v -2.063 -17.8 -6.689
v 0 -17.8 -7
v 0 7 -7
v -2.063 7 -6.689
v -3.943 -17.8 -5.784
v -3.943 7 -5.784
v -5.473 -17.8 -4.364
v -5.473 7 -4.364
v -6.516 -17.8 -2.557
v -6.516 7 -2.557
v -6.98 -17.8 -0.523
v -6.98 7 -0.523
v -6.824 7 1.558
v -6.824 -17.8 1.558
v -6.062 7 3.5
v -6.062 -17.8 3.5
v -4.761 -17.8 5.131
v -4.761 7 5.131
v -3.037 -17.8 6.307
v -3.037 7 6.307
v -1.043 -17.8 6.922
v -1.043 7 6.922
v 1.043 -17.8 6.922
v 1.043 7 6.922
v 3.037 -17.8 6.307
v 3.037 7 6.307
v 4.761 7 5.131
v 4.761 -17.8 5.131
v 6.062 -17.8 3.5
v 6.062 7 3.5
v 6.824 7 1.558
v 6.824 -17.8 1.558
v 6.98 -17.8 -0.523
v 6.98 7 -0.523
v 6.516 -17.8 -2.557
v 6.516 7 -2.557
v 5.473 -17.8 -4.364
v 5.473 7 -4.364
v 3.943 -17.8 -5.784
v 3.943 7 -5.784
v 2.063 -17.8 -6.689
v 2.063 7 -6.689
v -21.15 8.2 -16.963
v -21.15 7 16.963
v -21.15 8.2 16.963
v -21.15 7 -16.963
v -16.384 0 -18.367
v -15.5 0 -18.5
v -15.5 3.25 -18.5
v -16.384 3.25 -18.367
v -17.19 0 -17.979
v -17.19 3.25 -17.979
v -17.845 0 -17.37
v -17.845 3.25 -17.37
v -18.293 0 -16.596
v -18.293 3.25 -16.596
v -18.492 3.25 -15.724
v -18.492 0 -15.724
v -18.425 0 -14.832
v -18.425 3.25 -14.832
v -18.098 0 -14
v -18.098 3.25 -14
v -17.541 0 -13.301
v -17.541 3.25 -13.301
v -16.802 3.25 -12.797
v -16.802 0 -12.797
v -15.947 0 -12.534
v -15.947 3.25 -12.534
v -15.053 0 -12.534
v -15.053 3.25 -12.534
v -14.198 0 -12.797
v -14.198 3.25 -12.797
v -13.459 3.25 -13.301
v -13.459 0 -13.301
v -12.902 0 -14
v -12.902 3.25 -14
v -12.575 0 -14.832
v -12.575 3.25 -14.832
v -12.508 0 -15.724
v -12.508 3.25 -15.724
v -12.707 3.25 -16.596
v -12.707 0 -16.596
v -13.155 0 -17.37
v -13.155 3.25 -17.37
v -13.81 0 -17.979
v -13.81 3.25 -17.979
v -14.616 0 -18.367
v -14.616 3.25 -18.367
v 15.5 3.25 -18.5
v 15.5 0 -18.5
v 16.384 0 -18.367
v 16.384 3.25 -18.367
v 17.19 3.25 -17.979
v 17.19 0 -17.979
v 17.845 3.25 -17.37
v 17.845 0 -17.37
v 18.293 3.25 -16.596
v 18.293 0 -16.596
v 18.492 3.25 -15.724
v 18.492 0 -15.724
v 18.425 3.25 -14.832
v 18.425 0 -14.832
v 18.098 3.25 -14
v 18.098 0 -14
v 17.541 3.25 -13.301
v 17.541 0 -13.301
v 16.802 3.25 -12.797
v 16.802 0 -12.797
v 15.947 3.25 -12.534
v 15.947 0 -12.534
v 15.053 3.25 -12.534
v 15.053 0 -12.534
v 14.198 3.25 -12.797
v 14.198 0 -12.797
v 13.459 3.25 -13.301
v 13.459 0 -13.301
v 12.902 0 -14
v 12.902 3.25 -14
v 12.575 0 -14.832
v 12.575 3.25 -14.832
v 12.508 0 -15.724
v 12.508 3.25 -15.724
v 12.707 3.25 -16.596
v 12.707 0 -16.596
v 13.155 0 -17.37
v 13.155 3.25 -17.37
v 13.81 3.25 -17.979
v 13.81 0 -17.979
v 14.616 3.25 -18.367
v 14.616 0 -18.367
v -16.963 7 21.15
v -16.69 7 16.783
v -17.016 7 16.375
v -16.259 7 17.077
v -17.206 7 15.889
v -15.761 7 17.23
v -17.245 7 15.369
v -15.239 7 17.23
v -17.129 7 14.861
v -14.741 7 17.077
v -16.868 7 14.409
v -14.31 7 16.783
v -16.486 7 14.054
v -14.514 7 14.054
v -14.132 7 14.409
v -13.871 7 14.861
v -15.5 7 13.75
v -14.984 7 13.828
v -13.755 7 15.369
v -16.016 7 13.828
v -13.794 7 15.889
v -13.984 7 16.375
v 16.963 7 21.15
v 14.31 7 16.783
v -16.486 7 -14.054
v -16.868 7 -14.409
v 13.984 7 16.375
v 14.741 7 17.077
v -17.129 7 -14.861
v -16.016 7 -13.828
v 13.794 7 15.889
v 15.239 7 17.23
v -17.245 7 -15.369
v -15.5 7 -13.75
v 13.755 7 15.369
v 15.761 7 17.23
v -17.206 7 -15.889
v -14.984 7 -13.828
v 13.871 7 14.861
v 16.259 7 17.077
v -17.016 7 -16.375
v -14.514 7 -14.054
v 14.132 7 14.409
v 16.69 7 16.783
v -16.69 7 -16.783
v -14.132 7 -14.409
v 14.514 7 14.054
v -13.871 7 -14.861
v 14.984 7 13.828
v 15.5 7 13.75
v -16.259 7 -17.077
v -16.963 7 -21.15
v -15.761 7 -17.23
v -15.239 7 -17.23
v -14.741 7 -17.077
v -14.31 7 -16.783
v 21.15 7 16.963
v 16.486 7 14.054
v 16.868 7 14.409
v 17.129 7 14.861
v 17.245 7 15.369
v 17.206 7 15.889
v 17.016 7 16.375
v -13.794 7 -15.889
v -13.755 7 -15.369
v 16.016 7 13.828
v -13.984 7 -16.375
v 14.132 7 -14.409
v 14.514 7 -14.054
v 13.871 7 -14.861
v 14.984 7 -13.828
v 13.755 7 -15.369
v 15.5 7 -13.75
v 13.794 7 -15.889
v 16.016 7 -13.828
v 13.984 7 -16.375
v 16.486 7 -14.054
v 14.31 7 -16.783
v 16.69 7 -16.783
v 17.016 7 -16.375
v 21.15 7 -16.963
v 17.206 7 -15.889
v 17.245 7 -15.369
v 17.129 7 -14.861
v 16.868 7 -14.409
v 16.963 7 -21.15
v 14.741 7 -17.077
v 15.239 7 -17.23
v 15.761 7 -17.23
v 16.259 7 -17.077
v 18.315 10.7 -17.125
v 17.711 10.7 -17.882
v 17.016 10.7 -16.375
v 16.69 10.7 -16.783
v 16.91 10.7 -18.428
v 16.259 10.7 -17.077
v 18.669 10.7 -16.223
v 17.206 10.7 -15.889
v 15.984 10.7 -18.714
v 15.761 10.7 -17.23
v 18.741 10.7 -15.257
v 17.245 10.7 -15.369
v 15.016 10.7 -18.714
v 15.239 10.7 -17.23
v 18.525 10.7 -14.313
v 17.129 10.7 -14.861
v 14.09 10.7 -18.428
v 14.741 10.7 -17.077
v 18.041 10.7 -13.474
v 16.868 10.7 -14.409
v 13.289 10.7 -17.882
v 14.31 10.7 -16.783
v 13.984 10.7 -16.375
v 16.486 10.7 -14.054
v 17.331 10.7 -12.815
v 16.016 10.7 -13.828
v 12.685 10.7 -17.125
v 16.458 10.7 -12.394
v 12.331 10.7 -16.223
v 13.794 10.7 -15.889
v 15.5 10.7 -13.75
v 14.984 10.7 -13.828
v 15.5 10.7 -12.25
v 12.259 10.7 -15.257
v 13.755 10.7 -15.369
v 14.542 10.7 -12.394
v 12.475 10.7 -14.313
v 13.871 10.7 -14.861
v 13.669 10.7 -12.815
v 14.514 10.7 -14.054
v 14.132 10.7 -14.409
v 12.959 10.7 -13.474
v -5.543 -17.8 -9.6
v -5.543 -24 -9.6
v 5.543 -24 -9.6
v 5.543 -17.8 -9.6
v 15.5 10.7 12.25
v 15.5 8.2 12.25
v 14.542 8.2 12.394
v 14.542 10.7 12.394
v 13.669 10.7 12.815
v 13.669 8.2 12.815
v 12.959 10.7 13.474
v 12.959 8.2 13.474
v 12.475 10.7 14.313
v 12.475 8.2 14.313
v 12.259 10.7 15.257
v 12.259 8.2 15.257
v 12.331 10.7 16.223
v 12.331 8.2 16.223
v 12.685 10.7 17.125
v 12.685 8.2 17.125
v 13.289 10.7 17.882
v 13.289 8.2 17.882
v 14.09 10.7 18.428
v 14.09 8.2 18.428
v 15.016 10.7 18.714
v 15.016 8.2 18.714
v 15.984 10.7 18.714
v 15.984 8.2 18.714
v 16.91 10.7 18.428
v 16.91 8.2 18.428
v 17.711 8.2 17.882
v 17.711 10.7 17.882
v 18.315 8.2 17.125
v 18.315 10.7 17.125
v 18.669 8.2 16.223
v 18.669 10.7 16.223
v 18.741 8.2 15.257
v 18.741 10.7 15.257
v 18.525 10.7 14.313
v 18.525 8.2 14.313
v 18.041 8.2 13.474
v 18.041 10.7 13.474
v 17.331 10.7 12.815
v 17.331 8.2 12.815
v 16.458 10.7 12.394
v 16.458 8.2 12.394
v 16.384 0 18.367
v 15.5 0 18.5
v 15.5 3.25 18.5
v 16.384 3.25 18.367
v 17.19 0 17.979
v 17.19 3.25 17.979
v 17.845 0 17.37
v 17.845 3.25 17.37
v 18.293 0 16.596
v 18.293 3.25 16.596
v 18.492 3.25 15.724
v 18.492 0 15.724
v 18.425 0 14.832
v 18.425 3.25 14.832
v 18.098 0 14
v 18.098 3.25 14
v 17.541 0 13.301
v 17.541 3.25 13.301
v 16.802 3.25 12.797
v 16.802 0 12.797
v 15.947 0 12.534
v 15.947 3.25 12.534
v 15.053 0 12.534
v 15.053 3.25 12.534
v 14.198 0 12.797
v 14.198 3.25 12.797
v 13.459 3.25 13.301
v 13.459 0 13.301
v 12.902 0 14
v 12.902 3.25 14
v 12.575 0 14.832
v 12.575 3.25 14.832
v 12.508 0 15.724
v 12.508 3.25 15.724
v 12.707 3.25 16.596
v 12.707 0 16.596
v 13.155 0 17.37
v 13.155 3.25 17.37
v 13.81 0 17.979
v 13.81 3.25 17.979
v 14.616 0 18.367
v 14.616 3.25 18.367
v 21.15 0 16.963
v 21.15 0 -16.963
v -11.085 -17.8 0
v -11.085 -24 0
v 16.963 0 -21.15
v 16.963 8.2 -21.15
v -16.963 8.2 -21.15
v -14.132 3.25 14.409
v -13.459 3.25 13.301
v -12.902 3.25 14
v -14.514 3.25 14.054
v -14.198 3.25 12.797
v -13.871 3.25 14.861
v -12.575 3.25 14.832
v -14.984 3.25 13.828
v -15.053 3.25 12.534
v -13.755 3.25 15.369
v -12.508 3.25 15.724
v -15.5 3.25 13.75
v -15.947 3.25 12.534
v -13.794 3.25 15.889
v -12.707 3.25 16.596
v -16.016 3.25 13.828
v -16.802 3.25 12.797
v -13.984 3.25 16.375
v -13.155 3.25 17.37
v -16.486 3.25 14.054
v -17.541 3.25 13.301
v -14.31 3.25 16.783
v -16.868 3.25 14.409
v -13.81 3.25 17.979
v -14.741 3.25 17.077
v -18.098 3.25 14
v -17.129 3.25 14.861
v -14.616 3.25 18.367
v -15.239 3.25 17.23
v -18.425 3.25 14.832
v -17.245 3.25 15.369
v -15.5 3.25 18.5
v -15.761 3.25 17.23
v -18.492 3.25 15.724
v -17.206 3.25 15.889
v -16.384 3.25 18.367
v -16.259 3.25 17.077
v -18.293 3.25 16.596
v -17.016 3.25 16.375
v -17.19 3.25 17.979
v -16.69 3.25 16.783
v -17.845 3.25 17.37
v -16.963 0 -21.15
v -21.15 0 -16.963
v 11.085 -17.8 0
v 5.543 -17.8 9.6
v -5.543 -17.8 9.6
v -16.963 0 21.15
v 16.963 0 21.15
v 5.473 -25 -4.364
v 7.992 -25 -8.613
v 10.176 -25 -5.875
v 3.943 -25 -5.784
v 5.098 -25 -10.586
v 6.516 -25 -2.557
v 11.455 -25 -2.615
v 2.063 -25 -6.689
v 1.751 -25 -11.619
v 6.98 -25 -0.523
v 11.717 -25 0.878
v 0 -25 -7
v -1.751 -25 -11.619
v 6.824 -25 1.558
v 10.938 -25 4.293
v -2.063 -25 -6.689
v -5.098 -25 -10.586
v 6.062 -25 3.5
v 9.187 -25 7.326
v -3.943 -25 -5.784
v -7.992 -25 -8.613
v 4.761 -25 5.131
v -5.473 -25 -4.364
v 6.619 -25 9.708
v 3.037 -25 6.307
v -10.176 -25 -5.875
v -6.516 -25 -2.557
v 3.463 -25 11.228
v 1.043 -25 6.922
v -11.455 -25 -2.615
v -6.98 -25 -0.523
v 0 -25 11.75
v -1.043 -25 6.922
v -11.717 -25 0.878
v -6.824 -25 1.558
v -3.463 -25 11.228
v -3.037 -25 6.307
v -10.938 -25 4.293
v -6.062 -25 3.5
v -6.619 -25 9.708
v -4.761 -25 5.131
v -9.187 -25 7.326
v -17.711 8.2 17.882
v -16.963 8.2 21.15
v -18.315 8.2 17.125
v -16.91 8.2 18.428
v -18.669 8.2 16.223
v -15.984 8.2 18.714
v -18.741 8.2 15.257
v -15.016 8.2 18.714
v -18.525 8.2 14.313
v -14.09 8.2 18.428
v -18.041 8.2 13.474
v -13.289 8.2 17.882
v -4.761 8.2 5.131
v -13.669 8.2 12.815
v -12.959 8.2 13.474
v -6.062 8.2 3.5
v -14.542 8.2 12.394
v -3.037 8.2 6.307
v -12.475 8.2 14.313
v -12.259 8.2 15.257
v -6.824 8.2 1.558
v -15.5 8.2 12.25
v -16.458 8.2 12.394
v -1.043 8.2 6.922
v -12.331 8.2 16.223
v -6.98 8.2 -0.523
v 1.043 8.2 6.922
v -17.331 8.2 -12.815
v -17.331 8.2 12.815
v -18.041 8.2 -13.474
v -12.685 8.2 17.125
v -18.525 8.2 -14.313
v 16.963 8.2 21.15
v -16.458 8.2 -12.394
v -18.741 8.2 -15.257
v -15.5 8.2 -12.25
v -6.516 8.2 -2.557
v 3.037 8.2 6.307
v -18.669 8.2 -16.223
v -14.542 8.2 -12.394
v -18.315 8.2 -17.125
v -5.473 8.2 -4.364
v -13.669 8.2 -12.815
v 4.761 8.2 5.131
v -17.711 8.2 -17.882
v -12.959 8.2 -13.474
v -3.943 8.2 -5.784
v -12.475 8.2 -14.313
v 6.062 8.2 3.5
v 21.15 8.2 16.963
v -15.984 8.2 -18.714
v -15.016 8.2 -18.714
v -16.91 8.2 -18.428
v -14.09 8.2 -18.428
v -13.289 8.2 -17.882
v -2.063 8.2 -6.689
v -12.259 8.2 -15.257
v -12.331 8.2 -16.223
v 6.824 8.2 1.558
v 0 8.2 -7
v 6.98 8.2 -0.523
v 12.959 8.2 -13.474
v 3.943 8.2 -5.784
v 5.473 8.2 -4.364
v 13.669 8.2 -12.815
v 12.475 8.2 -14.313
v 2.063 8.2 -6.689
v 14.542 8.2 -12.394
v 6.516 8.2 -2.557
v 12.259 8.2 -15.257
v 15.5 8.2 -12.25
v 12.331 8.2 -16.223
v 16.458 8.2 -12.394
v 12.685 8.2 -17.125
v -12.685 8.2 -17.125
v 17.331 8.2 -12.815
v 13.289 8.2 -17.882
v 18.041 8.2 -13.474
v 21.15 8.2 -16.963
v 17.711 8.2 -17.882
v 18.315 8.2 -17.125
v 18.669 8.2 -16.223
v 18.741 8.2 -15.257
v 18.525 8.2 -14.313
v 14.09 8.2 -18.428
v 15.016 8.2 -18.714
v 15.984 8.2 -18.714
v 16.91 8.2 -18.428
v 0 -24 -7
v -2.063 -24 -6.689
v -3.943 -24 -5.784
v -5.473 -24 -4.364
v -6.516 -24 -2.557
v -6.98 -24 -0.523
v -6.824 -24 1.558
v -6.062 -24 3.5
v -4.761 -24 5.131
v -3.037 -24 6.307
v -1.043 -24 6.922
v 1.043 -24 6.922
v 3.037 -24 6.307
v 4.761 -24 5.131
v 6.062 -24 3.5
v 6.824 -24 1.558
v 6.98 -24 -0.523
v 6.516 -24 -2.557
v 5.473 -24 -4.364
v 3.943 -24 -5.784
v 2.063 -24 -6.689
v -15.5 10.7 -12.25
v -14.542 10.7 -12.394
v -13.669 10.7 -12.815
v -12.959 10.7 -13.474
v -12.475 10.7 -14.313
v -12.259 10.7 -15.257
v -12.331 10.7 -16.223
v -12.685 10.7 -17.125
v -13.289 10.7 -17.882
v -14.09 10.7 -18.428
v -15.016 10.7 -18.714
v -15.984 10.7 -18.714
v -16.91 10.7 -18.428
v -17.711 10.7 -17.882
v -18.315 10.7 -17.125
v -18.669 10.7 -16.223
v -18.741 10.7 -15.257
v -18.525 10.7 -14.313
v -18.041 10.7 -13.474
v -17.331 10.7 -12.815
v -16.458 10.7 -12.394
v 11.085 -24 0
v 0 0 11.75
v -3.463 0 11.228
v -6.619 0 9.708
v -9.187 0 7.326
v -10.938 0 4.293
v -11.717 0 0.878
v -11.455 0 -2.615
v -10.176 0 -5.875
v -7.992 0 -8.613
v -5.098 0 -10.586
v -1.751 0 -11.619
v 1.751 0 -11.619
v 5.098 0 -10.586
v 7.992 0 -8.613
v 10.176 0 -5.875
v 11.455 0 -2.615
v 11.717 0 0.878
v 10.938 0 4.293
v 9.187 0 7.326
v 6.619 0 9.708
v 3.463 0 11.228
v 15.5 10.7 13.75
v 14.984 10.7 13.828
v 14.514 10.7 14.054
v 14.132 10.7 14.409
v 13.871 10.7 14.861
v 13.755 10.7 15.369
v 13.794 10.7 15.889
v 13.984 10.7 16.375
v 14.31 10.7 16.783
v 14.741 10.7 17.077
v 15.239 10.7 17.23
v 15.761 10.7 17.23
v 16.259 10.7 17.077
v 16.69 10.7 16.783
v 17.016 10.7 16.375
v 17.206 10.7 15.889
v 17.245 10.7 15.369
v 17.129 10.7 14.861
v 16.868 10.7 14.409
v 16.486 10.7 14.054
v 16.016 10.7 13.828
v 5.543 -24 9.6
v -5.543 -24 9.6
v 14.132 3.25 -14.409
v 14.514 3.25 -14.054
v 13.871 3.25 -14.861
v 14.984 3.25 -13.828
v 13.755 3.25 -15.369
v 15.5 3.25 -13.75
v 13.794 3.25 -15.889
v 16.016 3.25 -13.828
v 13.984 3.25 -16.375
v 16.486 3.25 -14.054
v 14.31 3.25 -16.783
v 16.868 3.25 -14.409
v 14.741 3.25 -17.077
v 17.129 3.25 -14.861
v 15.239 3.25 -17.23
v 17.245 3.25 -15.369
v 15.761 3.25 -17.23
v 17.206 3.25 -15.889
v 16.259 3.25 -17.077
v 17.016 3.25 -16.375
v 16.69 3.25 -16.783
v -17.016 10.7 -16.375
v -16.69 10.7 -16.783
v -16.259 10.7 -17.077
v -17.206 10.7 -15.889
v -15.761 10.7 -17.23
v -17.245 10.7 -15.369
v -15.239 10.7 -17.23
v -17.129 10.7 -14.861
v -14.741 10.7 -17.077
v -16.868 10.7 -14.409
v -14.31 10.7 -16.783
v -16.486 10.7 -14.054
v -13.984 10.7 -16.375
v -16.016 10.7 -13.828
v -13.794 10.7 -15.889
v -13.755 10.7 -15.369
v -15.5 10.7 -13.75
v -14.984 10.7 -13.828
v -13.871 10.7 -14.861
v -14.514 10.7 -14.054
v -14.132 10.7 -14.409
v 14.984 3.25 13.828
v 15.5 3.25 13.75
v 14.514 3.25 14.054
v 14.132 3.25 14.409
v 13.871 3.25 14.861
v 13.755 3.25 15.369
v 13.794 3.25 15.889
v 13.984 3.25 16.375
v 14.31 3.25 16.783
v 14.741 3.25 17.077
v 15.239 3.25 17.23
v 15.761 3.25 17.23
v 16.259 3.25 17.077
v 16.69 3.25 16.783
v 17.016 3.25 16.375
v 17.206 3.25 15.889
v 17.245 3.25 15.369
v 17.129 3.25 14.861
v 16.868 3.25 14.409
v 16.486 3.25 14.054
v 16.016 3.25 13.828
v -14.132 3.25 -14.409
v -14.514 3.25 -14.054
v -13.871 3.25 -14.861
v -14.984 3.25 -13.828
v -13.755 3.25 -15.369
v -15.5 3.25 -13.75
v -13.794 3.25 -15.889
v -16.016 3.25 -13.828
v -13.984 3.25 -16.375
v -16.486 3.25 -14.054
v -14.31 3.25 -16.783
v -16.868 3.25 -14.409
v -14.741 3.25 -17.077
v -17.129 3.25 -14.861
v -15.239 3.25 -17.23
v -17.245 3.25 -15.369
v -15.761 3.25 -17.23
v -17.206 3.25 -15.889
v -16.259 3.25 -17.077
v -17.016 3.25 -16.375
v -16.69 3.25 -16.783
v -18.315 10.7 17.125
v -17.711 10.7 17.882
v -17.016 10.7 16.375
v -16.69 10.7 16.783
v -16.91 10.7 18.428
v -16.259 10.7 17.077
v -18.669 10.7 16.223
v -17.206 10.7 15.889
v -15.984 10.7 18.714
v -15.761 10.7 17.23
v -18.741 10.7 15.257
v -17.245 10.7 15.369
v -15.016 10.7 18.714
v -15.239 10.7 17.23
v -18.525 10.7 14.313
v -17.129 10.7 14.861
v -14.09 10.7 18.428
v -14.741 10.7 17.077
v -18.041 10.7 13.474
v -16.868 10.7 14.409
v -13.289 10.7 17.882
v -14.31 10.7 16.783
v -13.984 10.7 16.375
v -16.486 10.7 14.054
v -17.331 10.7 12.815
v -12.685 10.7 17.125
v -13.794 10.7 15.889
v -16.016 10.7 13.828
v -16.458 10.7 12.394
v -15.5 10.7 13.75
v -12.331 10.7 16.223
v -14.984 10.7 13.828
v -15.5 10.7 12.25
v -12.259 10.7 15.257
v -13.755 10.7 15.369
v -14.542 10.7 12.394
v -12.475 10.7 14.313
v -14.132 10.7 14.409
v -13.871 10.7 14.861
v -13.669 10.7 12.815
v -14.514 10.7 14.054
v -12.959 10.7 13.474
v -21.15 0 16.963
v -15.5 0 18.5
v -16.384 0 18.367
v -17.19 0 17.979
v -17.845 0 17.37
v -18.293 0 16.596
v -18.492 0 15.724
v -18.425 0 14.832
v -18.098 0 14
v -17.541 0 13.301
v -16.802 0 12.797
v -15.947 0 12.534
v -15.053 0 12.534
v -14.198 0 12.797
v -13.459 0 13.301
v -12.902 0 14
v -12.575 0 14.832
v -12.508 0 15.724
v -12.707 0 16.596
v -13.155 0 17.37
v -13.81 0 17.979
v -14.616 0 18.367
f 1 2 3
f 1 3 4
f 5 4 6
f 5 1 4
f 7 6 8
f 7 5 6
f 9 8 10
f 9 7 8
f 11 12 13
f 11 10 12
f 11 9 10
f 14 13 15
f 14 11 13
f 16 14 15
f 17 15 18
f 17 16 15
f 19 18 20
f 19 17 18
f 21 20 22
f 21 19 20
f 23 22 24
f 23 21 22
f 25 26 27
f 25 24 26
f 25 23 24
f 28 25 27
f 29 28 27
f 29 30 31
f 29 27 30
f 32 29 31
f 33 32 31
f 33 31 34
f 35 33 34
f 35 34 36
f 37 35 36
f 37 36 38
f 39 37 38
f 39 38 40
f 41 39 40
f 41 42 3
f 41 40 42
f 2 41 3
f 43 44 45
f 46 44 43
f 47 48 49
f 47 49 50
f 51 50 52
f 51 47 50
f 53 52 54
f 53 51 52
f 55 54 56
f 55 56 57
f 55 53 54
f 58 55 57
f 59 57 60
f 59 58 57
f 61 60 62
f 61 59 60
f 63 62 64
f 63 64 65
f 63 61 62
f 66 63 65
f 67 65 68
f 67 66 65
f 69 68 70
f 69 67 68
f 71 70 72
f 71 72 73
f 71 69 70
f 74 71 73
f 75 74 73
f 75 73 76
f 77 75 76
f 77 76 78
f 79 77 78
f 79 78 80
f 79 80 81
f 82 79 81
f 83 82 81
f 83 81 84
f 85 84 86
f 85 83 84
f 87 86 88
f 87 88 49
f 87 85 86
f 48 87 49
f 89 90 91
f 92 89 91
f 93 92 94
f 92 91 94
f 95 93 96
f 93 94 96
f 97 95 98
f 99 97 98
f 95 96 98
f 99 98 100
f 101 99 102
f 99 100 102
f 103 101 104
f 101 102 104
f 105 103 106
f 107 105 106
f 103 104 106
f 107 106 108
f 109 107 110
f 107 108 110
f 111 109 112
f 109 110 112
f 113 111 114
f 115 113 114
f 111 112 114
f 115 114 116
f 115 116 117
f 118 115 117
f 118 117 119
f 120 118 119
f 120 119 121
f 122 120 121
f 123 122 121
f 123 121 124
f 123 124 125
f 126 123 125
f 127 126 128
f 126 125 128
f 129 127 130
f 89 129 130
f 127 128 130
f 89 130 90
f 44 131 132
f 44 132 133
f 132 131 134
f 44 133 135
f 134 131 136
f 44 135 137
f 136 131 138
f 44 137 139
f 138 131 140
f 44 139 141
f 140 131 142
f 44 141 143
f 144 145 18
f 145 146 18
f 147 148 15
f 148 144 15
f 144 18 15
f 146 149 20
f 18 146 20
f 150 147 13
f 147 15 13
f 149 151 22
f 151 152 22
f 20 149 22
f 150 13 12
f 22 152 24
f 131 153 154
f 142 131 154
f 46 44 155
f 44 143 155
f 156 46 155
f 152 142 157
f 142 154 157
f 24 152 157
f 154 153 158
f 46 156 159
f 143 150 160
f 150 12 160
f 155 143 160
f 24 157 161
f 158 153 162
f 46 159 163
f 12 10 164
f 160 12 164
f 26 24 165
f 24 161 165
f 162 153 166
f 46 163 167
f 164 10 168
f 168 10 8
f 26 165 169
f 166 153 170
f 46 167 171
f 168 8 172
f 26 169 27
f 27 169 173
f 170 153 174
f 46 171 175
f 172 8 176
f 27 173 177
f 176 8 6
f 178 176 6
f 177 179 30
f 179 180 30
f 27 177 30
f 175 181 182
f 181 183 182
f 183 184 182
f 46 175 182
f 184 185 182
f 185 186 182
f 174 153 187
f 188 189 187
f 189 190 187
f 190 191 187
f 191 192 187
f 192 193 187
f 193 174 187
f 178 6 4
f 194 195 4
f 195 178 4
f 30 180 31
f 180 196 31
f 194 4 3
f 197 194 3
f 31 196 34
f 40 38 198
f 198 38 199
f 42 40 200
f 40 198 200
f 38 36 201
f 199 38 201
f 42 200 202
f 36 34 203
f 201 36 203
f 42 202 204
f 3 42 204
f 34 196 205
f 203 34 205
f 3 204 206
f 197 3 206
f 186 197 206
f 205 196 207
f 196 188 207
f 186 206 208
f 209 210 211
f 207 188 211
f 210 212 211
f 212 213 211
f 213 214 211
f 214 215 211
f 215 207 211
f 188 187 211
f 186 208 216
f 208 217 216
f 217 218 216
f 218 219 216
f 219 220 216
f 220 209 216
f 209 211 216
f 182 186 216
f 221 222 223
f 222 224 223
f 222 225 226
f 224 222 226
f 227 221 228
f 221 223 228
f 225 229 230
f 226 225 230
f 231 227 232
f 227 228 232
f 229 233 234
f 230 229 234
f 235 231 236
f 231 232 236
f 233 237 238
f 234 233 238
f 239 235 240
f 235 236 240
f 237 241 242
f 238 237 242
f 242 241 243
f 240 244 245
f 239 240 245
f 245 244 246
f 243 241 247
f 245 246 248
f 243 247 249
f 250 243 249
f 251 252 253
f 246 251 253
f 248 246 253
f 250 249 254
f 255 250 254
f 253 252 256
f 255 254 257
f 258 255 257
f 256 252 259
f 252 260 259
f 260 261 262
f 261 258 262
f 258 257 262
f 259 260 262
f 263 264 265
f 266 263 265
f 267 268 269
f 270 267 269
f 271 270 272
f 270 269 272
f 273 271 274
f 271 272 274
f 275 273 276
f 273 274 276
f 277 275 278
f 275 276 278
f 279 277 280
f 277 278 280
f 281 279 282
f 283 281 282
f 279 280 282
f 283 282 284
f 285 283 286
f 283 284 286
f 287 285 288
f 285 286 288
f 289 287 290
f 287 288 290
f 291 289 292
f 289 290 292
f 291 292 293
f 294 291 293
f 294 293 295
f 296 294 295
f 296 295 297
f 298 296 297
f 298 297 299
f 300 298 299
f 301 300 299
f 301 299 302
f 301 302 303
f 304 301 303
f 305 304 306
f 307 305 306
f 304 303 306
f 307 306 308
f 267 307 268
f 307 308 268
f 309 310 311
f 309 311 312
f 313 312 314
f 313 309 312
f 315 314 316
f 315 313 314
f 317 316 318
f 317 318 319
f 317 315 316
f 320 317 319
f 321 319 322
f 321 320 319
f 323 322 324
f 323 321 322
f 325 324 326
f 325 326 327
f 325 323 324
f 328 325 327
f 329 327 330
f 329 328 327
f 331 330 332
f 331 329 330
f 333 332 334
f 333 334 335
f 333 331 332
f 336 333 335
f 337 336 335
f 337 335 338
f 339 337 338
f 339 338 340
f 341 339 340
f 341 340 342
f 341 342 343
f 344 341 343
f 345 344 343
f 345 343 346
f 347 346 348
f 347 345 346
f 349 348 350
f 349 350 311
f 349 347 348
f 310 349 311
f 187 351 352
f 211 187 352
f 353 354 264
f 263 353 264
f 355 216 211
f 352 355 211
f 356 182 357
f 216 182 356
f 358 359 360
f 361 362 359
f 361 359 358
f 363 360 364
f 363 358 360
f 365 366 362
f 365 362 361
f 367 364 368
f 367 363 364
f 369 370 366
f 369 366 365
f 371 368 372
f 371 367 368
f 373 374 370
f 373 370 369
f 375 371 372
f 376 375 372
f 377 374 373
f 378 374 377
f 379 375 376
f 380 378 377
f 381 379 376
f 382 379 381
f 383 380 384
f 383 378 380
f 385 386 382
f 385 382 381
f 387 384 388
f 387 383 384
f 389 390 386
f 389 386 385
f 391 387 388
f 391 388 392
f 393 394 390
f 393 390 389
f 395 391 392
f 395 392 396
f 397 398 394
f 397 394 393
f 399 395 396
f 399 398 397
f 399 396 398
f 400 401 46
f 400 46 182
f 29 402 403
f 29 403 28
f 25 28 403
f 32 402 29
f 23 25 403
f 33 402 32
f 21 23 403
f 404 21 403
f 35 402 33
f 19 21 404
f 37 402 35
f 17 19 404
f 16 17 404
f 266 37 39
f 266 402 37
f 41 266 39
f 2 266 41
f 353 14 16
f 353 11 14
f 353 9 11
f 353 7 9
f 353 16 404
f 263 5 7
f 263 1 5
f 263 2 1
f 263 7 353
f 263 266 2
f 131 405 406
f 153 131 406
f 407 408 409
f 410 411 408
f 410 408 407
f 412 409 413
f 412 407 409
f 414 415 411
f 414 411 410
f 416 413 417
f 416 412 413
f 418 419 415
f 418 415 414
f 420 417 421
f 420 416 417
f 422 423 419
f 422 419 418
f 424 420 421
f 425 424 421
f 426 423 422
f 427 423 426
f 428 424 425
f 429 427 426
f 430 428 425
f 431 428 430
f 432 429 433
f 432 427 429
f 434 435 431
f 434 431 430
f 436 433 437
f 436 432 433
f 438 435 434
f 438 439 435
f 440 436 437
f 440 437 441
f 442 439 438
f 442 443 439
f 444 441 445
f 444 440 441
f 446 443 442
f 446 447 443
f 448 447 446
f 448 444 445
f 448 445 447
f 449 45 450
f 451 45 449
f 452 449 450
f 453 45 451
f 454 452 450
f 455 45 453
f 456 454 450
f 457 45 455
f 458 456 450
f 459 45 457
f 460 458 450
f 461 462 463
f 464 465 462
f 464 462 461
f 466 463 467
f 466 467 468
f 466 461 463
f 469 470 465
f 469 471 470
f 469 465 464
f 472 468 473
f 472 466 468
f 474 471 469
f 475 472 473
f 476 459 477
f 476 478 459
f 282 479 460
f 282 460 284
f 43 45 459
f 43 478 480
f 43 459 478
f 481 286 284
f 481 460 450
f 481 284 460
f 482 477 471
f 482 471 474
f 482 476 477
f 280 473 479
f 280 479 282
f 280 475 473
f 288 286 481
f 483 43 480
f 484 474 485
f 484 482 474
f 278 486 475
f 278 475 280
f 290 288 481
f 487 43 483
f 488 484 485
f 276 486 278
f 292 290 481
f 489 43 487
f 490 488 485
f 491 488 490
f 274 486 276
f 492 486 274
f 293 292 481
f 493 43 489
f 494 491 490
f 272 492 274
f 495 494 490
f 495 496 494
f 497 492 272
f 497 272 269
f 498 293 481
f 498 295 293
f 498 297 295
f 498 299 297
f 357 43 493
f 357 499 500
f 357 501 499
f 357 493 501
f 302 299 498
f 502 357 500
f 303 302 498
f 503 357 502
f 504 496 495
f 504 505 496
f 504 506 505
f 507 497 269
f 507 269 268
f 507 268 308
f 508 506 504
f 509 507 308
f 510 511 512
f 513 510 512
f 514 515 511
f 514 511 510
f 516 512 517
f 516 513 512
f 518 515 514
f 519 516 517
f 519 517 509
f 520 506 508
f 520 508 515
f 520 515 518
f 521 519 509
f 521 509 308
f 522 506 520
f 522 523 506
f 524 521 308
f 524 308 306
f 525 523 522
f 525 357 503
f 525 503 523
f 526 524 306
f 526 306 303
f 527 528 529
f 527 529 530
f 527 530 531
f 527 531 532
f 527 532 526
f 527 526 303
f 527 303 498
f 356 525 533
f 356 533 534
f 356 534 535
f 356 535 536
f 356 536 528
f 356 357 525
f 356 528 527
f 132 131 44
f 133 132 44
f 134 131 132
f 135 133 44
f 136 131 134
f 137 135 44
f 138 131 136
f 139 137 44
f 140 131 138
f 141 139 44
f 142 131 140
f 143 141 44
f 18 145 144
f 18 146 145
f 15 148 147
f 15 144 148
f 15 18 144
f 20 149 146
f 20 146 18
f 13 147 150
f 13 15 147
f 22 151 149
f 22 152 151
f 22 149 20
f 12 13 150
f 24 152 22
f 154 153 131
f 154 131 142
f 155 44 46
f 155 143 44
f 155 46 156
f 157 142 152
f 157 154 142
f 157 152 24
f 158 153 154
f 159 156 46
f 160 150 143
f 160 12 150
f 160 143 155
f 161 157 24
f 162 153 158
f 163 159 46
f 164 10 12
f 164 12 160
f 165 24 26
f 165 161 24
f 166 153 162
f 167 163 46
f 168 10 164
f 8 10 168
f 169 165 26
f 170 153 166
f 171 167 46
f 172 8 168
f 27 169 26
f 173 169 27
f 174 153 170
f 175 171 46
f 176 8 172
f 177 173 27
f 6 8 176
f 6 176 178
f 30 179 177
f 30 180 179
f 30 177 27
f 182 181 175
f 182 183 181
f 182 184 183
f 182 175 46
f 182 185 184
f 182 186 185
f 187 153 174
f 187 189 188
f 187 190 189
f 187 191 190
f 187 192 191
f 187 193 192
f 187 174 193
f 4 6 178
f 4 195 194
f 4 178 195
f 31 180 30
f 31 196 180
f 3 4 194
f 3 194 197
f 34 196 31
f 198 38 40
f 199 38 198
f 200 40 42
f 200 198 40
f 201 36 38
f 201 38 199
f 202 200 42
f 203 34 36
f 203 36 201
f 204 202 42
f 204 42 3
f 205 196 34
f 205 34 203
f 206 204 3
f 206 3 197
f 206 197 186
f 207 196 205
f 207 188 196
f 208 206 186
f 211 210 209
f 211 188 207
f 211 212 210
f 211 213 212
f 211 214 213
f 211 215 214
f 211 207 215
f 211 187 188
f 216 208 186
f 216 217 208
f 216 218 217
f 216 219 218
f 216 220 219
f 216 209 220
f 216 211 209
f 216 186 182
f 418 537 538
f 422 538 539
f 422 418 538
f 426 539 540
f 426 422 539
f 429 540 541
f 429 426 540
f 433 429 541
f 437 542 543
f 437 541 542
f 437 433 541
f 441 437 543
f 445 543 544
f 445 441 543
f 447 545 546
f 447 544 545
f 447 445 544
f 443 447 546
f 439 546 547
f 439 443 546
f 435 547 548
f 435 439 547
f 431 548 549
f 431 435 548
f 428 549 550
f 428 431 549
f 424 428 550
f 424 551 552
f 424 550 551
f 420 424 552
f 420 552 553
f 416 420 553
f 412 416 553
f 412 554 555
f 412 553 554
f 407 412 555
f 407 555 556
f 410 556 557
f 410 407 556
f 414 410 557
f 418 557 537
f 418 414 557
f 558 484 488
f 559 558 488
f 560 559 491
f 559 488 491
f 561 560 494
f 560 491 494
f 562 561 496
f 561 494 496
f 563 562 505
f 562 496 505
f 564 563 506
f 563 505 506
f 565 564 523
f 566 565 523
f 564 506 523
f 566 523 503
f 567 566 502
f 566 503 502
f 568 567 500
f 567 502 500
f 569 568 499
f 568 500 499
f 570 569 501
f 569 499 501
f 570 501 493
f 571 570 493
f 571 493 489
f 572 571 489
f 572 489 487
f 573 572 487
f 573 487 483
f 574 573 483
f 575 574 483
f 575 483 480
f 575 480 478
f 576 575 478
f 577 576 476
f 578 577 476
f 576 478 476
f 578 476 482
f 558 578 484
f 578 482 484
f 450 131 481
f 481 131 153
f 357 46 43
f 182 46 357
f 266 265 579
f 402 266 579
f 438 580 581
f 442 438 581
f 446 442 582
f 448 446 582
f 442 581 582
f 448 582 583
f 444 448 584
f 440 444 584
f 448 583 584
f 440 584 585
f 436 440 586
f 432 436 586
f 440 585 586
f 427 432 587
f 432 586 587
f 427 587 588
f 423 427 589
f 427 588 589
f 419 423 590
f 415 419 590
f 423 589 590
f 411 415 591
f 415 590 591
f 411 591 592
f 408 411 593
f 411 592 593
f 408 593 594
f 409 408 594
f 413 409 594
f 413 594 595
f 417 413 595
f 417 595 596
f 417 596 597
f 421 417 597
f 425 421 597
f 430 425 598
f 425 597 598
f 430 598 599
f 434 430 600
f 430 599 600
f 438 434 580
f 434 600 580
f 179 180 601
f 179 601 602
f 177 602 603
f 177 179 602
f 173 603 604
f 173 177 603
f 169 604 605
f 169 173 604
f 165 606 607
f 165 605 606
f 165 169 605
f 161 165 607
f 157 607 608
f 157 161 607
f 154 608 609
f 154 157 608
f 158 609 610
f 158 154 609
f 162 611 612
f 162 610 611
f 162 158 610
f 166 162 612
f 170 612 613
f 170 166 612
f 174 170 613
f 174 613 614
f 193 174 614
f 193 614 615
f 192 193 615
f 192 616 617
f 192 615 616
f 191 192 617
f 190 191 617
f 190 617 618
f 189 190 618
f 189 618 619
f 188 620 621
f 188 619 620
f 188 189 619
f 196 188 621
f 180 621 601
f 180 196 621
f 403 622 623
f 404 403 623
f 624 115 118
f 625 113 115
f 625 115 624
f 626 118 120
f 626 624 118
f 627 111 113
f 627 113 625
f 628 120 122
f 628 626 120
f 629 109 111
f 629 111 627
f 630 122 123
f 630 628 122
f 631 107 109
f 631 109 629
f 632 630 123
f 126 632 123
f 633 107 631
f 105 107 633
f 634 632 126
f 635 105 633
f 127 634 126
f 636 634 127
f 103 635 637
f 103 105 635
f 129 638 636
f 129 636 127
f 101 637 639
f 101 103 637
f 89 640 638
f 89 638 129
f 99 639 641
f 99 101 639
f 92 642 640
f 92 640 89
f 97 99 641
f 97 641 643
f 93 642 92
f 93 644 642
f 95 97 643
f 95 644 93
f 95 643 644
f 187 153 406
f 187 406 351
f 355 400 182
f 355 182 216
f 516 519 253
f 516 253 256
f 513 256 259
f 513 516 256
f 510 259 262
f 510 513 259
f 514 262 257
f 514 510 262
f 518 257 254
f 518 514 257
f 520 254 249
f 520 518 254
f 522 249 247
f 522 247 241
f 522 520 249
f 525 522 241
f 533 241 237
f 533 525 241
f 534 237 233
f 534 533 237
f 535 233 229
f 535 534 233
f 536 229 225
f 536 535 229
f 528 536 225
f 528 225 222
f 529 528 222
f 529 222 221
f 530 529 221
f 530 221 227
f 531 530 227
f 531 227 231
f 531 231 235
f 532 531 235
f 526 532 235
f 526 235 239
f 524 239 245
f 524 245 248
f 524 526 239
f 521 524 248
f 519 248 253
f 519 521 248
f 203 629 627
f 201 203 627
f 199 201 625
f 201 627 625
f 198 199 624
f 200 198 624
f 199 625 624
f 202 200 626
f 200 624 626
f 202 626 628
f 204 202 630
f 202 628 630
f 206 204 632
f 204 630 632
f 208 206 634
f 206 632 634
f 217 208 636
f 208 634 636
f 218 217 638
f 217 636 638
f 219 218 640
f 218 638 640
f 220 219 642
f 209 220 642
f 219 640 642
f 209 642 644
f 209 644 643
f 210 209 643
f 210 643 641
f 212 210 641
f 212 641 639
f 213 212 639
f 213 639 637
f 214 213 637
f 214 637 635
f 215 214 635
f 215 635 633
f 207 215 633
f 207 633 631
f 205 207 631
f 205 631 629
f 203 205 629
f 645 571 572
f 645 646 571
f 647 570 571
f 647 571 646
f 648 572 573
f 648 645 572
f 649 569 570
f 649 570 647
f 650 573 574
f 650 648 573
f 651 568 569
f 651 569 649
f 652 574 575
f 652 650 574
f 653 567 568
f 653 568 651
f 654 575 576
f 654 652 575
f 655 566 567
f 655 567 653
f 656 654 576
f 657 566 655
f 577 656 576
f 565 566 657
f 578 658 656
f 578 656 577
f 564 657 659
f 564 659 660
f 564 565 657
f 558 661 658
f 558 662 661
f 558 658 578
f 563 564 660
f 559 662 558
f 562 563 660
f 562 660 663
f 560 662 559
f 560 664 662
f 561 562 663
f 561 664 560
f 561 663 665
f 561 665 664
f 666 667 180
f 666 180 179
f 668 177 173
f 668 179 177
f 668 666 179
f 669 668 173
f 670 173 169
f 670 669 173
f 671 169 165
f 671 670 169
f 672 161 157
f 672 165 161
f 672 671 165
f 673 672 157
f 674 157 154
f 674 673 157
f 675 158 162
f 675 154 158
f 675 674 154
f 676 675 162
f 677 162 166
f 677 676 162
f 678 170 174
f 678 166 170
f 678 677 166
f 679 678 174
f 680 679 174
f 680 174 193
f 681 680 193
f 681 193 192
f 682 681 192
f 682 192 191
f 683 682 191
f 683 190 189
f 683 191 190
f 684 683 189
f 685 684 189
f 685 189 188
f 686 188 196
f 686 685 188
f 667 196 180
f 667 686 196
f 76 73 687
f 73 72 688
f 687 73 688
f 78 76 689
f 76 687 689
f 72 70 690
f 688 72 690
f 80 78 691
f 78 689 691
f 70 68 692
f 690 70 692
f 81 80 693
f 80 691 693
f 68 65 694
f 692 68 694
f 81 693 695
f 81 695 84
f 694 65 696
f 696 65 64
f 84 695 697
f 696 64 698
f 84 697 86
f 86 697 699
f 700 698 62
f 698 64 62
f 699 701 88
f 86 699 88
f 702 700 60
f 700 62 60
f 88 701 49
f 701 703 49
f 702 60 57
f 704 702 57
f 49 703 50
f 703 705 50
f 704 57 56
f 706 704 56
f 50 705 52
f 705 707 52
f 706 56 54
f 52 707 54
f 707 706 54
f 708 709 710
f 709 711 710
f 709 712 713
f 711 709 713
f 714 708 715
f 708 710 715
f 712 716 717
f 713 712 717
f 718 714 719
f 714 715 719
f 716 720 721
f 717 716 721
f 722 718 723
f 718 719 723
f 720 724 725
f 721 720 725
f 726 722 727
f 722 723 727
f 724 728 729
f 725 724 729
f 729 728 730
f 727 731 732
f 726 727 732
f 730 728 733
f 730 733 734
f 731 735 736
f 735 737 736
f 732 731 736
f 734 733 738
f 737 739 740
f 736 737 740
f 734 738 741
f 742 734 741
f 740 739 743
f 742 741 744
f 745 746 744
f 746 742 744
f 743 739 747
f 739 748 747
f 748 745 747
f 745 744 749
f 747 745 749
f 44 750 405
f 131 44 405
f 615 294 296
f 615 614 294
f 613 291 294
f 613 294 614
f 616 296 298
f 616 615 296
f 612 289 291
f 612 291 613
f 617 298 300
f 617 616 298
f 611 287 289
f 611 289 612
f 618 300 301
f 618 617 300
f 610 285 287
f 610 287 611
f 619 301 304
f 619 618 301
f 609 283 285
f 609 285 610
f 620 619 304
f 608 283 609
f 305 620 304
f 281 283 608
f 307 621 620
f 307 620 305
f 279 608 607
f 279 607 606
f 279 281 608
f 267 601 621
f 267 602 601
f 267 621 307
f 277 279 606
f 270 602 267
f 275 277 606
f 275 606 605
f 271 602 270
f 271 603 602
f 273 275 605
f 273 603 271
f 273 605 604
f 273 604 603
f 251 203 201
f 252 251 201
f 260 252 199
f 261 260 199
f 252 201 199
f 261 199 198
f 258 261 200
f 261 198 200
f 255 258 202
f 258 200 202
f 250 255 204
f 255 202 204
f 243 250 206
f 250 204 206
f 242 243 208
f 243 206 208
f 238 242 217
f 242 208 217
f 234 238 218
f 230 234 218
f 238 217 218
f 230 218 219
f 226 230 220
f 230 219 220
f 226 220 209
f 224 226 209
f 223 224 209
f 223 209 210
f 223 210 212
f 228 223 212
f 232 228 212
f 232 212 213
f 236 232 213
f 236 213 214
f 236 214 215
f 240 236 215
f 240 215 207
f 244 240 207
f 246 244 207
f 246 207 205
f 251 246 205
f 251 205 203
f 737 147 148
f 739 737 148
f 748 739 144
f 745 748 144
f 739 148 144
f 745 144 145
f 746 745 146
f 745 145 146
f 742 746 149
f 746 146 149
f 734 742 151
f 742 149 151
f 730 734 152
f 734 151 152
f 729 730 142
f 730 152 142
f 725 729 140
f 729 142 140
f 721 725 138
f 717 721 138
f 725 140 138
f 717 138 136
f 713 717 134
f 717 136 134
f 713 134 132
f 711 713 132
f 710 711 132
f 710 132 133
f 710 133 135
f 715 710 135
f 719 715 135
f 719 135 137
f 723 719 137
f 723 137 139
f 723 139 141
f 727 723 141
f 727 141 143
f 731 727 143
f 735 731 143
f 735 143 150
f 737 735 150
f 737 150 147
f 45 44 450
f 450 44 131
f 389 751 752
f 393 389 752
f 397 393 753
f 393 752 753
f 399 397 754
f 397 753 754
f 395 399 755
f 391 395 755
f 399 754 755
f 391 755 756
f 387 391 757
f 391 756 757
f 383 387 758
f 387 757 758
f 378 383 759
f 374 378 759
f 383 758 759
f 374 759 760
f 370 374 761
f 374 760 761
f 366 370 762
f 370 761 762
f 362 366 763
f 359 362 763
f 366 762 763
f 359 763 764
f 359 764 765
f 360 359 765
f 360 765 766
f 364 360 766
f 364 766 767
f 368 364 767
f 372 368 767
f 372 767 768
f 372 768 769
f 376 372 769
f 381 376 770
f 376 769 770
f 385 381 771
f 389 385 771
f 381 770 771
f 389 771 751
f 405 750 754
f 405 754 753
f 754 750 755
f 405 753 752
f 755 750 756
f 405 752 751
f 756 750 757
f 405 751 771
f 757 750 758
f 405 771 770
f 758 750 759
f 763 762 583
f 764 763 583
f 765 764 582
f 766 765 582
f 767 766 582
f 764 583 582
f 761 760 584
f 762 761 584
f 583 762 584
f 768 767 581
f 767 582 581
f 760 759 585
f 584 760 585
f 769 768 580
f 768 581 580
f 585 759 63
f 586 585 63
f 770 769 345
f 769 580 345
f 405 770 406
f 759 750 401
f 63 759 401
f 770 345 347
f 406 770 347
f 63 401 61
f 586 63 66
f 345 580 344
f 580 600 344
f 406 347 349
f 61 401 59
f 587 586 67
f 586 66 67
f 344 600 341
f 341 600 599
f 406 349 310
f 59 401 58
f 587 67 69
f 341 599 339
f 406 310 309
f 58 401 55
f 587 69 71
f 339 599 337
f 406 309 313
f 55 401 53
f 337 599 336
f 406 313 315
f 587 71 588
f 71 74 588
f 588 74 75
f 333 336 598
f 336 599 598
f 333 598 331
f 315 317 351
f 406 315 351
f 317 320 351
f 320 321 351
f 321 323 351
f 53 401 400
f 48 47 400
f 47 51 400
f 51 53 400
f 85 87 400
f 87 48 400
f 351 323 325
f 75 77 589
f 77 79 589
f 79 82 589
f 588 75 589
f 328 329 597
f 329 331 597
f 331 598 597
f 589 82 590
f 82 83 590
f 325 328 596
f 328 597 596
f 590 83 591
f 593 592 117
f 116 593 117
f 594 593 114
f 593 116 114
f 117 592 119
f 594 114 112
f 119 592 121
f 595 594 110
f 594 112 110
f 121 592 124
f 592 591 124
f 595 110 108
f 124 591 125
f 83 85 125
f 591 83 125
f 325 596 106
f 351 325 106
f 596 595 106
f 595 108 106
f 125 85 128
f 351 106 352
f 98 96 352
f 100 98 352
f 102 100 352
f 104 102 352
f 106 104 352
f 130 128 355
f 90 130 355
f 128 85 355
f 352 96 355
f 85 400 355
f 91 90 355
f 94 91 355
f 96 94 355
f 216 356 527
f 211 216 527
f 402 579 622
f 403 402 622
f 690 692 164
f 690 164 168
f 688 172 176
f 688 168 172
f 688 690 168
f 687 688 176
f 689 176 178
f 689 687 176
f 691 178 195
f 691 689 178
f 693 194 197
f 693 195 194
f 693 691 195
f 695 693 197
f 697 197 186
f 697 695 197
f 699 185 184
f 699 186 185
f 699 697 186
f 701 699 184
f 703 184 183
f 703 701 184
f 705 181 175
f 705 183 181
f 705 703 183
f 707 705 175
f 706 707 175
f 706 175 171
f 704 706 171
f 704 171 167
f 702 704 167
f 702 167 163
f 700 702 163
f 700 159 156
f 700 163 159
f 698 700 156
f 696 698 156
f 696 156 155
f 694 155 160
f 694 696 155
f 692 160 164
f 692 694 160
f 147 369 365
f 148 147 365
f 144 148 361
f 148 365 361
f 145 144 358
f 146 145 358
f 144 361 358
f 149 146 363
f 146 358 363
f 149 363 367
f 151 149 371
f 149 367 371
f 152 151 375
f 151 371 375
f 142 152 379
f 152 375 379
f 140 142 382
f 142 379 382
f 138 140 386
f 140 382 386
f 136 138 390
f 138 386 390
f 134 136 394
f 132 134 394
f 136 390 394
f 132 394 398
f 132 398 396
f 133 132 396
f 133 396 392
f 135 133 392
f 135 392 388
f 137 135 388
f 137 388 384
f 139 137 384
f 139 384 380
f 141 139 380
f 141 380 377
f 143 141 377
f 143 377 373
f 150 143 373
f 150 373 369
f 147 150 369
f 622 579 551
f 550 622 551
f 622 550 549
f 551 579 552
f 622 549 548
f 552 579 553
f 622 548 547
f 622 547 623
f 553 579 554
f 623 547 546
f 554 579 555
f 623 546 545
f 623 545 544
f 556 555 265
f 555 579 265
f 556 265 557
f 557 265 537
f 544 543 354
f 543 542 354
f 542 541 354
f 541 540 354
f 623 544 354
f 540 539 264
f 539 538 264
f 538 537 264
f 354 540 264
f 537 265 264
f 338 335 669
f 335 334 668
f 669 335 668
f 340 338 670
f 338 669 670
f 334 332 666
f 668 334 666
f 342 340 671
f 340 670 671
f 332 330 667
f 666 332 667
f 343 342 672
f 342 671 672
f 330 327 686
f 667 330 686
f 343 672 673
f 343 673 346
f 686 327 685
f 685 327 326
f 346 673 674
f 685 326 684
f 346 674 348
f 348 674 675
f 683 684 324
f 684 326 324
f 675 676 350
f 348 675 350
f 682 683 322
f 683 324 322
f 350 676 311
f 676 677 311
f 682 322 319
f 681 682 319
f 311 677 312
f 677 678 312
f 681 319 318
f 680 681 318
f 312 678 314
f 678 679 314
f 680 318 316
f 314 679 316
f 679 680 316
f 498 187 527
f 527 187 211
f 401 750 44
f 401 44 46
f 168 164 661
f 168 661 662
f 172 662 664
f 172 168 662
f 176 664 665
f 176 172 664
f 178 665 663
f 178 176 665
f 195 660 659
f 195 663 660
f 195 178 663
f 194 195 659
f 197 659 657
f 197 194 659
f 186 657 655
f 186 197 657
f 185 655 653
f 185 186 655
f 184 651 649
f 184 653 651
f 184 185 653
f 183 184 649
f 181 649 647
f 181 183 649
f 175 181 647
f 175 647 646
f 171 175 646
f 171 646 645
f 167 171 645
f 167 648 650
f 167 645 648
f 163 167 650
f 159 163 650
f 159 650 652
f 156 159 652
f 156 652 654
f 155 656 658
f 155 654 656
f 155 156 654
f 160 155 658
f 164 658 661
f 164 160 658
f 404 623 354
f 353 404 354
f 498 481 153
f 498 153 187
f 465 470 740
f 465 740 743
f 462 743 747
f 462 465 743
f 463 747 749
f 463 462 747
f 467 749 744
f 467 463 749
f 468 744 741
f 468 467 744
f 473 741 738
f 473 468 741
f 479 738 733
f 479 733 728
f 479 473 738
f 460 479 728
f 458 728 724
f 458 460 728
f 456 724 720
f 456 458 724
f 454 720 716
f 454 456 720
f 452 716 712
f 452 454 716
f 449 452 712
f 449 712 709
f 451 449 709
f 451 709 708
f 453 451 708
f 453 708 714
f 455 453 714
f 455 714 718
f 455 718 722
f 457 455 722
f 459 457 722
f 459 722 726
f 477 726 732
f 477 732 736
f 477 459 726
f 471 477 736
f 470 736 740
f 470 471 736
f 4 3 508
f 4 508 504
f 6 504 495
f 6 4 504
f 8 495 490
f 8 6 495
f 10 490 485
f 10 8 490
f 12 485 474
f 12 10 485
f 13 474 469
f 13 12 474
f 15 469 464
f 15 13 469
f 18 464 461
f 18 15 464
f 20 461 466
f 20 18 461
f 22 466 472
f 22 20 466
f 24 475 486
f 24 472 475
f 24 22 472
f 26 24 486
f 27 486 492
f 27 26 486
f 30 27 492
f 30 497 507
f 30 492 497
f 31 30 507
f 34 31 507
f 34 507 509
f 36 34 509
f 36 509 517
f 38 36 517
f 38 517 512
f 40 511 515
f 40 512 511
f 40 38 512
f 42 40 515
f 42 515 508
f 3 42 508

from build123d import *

# Parameters (mm, degrees)
SKETCH1_W               = 42.3
SKETCH1_H               = 42.3
BOSS_EXTRUDE1_DEPTH     = 8.2
CUT_EXTRUDE3_DEPTH      = 32.014270909
SKETCH6_R               = 3.25
BOSS_EXTRUDE2_DEPTH     = 2.5
SKETCH7_R               = 1.75
CUT_EXTRUDE6_DEPTH      = 32.766885274
SKETCH10_R              = 3
CUT_EXTRUDE9_DEPTH      = 3.25
MIRROR5_COPY_1_SKETCH_R = 3.25
MIRROR5_COPY_1_DEPTH    = 2.5
MIRROR5_COPY_2_SKETCH_R = 1.75
MIRROR5_COPY_2_DEPTH    = 32.766885274
MIRROR5_COPY_3_SKETCH_R = 3
MIRROR5_COPY_3_DEPTH    = 3.25
SKETCH11_R              = 11.75
BOSS_EXTRUDE3_DEPTH     = 25
CUT_EXTRUDE10_START     = -1
CUT_EXTRUDE10_DEPTH     = 6.2
SKETCH8_R               = 7
CUT_EXTRUDE11_DEPTH     = 47.573973419


with BuildPart() as part:
    # Sketch1 → Boss-Extrude1 (new body)
    with BuildSketch(Plane(origin=(0, 0, 0), x_dir=(1, 0, 0), z_dir=(0, 1, 0))):
        Rectangle(SKETCH1_W, SKETCH1_H)
    extrude(amount=BOSS_EXTRUDE1_DEPTH)

    # Sketch4 → Cut-Extrude3 (cut, symmetric)
    with BuildSketch(Plane(origin=(0, 0, 0), x_dir=(1, 0, 0), z_dir=(0, 1, 0))):
        Polygon((-21.15, 16.963055506), (-16.963055506, 21.15), (-21.15, 21.15), align=None)
        Polygon((16.963055506, -21.15), (21.15, -16.963055506), (21.15, -21.15), align=None)
    cut_extrude3 = extrude(amount=CUT_EXTRUDE3_DEPTH, both=True, mode=Mode.SUBTRACT)

    # Mirror1: Cut-Extrude3 across plane
    add(cut_extrude3.mirror(Plane.XY), mode=Mode.SUBTRACT)

    # Sketch6 → Boss-Extrude2 (add)
    with BuildSketch(Plane(origin=(0, 8.2, 0), x_dir=(1, 0, 0), z_dir=(0, 1, 0))):
        with Locations(Location((-15.5, 15.5, 0), (0, 0, 270))):
            Circle(SKETCH6_R)
    boss_extrude2 = extrude(amount=BOSS_EXTRUDE2_DEPTH)

    # Sketch7 → Cut-Extrude6 (cut, through all)
    with BuildSketch(Plane(origin=(0, 0, 0), x_dir=(1, 0, 0), z_dir=(0, 1, 0))):
        with Locations(Location((-15.5, 15.5, 0), (0, 0, 270))):
            Circle(SKETCH7_R)
    cut_extrude6 = extrude(amount=CUT_EXTRUDE6_DEPTH, mode=Mode.SUBTRACT)

    # Sketch10 → Cut-Extrude9 (cut)
    with BuildSketch(Plane(origin=(0, 0, 0), x_dir=(-1, 0, 0), z_dir=(0, 1, 0))):
        with Locations(Location((15.5, -15.5, 0), (0, 0, 270))):
            Circle(SKETCH10_R)
    cut_extrude9 = extrude(amount=CUT_EXTRUDE9_DEPTH, mode=Mode.SUBTRACT)

    # Mirror4: Boss-Extrude2, Cut-Extrude6, Cut-Extrude9 across plane
    add(boss_extrude2.mirror(Plane(origin=(0, 0, 0), x_dir=(0, 0, 1), z_dir=(1, 0, 0))))
    add(cut_extrude6.mirror(Plane(origin=(0, 0, 0), x_dir=(0, 0, 1), z_dir=(1, 0, 0))), mode=Mode.SUBTRACT)
    add(cut_extrude9.mirror(Plane(origin=(0, 0, 0), x_dir=(0, 0, 1), z_dir=(1, 0, 0))), mode=Mode.SUBTRACT)

    # Mirror5: Boss-Extrude2, Cut-Extrude6, Cut-Extrude9 across plane
    add(boss_extrude2.mirror(Plane.XY))
    add(cut_extrude6.mirror(Plane.XY), mode=Mode.SUBTRACT)
    add(cut_extrude9.mirror(Plane.XY), mode=Mode.SUBTRACT)

    # Mirror5 copy 1 sketch → Mirror5 copy 1 (add)
    with BuildSketch(Plane(origin=(0, 8.2, 0), x_dir=(-1, 0, 0), z_dir=(0, 1, 0))):
        with Locations(Location((-15.5, 15.5, 0), (0, 0, 270))):
            Circle(MIRROR5_COPY_1_SKETCH_R)
    extrude(amount=MIRROR5_COPY_1_DEPTH)

    # Mirror5 copy 2 sketch → Mirror5 copy 2 (cut, through all)
    with BuildSketch(Plane(origin=(0, 0, 0), x_dir=(-1, 0, 0), z_dir=(0, 1, 0))):
        with Locations(Location((-15.5, 15.5, 0), (0, 0, 270))):
            Circle(MIRROR5_COPY_2_SKETCH_R)
    extrude(amount=MIRROR5_COPY_2_DEPTH, mode=Mode.SUBTRACT)

    # Mirror5 copy 3 sketch → Mirror5 copy 3 (cut)
    with BuildSketch(Plane(origin=(0, 0, 0), x_dir=(1, 0, 0), z_dir=(0, 1, 0))):
        with Locations(Location((15.5, -15.5, 0), (0, 0, 270))):
            Circle(MIRROR5_COPY_3_SKETCH_R)
    extrude(amount=MIRROR5_COPY_3_DEPTH, mode=Mode.SUBTRACT)

    # Sketch11 → Boss-Extrude3 (add)
    with BuildSketch(Plane.XZ):
        with Locations(Location((0, 0, 0), (0, 0, 90))):
            Circle(SKETCH11_R)
    extrude(amount=BOSS_EXTRUDE3_DEPTH)

    # Sketch2 → Cut-Extrude10 (cut)
    with BuildSketch(Plane(origin=(0, -25, 0), x_dir=(-1, 0, 0), z_dir=(0, -1, 0)).offset(CUT_EXTRUDE10_START)):
        Polygon((11.085125168, 0), (5.542562584, 9.6), (-5.542562584, 9.6), (-11.085125168, 0), (-5.542562584, -9.6), (5.542562584, -9.6), align=None)
    extrude(amount=-CUT_EXTRUDE10_DEPTH, mode=Mode.SUBTRACT)

    # Sketch8 → Cut-Extrude11 (cut, through all)
    with BuildSketch(Plane(origin=(0, -25, 0), x_dir=(1, 0, 0), z_dir=(0, 1, 0))):
        with Locations(Location((0, 0, 0), (0, 0, 90))):
            Circle(SKETCH8_R)
    extrude(amount=CUT_EXTRUDE11_DEPTH, mode=Mode.SUBTRACT)


with BuildPart() as body_2:
    # Split1: the piece on the far side of the plane
    add(part.part)
    split(bisect_by=Plane(origin=(0, 7, 0), x_dir=(0, 0, -1), z_dir=(0, -1, 0)), keep=Keep.BOTTOM)


with BuildPart() as part_1:
    add(part.part)

    # Split1
    split(bisect_by=Plane(origin=(0, 7, 0), x_dir=(0, 0, -1), z_dir=(0, -1, 0)), keep=Keep.TOP)


solid = Compound([body_2.part, part_1.part])
